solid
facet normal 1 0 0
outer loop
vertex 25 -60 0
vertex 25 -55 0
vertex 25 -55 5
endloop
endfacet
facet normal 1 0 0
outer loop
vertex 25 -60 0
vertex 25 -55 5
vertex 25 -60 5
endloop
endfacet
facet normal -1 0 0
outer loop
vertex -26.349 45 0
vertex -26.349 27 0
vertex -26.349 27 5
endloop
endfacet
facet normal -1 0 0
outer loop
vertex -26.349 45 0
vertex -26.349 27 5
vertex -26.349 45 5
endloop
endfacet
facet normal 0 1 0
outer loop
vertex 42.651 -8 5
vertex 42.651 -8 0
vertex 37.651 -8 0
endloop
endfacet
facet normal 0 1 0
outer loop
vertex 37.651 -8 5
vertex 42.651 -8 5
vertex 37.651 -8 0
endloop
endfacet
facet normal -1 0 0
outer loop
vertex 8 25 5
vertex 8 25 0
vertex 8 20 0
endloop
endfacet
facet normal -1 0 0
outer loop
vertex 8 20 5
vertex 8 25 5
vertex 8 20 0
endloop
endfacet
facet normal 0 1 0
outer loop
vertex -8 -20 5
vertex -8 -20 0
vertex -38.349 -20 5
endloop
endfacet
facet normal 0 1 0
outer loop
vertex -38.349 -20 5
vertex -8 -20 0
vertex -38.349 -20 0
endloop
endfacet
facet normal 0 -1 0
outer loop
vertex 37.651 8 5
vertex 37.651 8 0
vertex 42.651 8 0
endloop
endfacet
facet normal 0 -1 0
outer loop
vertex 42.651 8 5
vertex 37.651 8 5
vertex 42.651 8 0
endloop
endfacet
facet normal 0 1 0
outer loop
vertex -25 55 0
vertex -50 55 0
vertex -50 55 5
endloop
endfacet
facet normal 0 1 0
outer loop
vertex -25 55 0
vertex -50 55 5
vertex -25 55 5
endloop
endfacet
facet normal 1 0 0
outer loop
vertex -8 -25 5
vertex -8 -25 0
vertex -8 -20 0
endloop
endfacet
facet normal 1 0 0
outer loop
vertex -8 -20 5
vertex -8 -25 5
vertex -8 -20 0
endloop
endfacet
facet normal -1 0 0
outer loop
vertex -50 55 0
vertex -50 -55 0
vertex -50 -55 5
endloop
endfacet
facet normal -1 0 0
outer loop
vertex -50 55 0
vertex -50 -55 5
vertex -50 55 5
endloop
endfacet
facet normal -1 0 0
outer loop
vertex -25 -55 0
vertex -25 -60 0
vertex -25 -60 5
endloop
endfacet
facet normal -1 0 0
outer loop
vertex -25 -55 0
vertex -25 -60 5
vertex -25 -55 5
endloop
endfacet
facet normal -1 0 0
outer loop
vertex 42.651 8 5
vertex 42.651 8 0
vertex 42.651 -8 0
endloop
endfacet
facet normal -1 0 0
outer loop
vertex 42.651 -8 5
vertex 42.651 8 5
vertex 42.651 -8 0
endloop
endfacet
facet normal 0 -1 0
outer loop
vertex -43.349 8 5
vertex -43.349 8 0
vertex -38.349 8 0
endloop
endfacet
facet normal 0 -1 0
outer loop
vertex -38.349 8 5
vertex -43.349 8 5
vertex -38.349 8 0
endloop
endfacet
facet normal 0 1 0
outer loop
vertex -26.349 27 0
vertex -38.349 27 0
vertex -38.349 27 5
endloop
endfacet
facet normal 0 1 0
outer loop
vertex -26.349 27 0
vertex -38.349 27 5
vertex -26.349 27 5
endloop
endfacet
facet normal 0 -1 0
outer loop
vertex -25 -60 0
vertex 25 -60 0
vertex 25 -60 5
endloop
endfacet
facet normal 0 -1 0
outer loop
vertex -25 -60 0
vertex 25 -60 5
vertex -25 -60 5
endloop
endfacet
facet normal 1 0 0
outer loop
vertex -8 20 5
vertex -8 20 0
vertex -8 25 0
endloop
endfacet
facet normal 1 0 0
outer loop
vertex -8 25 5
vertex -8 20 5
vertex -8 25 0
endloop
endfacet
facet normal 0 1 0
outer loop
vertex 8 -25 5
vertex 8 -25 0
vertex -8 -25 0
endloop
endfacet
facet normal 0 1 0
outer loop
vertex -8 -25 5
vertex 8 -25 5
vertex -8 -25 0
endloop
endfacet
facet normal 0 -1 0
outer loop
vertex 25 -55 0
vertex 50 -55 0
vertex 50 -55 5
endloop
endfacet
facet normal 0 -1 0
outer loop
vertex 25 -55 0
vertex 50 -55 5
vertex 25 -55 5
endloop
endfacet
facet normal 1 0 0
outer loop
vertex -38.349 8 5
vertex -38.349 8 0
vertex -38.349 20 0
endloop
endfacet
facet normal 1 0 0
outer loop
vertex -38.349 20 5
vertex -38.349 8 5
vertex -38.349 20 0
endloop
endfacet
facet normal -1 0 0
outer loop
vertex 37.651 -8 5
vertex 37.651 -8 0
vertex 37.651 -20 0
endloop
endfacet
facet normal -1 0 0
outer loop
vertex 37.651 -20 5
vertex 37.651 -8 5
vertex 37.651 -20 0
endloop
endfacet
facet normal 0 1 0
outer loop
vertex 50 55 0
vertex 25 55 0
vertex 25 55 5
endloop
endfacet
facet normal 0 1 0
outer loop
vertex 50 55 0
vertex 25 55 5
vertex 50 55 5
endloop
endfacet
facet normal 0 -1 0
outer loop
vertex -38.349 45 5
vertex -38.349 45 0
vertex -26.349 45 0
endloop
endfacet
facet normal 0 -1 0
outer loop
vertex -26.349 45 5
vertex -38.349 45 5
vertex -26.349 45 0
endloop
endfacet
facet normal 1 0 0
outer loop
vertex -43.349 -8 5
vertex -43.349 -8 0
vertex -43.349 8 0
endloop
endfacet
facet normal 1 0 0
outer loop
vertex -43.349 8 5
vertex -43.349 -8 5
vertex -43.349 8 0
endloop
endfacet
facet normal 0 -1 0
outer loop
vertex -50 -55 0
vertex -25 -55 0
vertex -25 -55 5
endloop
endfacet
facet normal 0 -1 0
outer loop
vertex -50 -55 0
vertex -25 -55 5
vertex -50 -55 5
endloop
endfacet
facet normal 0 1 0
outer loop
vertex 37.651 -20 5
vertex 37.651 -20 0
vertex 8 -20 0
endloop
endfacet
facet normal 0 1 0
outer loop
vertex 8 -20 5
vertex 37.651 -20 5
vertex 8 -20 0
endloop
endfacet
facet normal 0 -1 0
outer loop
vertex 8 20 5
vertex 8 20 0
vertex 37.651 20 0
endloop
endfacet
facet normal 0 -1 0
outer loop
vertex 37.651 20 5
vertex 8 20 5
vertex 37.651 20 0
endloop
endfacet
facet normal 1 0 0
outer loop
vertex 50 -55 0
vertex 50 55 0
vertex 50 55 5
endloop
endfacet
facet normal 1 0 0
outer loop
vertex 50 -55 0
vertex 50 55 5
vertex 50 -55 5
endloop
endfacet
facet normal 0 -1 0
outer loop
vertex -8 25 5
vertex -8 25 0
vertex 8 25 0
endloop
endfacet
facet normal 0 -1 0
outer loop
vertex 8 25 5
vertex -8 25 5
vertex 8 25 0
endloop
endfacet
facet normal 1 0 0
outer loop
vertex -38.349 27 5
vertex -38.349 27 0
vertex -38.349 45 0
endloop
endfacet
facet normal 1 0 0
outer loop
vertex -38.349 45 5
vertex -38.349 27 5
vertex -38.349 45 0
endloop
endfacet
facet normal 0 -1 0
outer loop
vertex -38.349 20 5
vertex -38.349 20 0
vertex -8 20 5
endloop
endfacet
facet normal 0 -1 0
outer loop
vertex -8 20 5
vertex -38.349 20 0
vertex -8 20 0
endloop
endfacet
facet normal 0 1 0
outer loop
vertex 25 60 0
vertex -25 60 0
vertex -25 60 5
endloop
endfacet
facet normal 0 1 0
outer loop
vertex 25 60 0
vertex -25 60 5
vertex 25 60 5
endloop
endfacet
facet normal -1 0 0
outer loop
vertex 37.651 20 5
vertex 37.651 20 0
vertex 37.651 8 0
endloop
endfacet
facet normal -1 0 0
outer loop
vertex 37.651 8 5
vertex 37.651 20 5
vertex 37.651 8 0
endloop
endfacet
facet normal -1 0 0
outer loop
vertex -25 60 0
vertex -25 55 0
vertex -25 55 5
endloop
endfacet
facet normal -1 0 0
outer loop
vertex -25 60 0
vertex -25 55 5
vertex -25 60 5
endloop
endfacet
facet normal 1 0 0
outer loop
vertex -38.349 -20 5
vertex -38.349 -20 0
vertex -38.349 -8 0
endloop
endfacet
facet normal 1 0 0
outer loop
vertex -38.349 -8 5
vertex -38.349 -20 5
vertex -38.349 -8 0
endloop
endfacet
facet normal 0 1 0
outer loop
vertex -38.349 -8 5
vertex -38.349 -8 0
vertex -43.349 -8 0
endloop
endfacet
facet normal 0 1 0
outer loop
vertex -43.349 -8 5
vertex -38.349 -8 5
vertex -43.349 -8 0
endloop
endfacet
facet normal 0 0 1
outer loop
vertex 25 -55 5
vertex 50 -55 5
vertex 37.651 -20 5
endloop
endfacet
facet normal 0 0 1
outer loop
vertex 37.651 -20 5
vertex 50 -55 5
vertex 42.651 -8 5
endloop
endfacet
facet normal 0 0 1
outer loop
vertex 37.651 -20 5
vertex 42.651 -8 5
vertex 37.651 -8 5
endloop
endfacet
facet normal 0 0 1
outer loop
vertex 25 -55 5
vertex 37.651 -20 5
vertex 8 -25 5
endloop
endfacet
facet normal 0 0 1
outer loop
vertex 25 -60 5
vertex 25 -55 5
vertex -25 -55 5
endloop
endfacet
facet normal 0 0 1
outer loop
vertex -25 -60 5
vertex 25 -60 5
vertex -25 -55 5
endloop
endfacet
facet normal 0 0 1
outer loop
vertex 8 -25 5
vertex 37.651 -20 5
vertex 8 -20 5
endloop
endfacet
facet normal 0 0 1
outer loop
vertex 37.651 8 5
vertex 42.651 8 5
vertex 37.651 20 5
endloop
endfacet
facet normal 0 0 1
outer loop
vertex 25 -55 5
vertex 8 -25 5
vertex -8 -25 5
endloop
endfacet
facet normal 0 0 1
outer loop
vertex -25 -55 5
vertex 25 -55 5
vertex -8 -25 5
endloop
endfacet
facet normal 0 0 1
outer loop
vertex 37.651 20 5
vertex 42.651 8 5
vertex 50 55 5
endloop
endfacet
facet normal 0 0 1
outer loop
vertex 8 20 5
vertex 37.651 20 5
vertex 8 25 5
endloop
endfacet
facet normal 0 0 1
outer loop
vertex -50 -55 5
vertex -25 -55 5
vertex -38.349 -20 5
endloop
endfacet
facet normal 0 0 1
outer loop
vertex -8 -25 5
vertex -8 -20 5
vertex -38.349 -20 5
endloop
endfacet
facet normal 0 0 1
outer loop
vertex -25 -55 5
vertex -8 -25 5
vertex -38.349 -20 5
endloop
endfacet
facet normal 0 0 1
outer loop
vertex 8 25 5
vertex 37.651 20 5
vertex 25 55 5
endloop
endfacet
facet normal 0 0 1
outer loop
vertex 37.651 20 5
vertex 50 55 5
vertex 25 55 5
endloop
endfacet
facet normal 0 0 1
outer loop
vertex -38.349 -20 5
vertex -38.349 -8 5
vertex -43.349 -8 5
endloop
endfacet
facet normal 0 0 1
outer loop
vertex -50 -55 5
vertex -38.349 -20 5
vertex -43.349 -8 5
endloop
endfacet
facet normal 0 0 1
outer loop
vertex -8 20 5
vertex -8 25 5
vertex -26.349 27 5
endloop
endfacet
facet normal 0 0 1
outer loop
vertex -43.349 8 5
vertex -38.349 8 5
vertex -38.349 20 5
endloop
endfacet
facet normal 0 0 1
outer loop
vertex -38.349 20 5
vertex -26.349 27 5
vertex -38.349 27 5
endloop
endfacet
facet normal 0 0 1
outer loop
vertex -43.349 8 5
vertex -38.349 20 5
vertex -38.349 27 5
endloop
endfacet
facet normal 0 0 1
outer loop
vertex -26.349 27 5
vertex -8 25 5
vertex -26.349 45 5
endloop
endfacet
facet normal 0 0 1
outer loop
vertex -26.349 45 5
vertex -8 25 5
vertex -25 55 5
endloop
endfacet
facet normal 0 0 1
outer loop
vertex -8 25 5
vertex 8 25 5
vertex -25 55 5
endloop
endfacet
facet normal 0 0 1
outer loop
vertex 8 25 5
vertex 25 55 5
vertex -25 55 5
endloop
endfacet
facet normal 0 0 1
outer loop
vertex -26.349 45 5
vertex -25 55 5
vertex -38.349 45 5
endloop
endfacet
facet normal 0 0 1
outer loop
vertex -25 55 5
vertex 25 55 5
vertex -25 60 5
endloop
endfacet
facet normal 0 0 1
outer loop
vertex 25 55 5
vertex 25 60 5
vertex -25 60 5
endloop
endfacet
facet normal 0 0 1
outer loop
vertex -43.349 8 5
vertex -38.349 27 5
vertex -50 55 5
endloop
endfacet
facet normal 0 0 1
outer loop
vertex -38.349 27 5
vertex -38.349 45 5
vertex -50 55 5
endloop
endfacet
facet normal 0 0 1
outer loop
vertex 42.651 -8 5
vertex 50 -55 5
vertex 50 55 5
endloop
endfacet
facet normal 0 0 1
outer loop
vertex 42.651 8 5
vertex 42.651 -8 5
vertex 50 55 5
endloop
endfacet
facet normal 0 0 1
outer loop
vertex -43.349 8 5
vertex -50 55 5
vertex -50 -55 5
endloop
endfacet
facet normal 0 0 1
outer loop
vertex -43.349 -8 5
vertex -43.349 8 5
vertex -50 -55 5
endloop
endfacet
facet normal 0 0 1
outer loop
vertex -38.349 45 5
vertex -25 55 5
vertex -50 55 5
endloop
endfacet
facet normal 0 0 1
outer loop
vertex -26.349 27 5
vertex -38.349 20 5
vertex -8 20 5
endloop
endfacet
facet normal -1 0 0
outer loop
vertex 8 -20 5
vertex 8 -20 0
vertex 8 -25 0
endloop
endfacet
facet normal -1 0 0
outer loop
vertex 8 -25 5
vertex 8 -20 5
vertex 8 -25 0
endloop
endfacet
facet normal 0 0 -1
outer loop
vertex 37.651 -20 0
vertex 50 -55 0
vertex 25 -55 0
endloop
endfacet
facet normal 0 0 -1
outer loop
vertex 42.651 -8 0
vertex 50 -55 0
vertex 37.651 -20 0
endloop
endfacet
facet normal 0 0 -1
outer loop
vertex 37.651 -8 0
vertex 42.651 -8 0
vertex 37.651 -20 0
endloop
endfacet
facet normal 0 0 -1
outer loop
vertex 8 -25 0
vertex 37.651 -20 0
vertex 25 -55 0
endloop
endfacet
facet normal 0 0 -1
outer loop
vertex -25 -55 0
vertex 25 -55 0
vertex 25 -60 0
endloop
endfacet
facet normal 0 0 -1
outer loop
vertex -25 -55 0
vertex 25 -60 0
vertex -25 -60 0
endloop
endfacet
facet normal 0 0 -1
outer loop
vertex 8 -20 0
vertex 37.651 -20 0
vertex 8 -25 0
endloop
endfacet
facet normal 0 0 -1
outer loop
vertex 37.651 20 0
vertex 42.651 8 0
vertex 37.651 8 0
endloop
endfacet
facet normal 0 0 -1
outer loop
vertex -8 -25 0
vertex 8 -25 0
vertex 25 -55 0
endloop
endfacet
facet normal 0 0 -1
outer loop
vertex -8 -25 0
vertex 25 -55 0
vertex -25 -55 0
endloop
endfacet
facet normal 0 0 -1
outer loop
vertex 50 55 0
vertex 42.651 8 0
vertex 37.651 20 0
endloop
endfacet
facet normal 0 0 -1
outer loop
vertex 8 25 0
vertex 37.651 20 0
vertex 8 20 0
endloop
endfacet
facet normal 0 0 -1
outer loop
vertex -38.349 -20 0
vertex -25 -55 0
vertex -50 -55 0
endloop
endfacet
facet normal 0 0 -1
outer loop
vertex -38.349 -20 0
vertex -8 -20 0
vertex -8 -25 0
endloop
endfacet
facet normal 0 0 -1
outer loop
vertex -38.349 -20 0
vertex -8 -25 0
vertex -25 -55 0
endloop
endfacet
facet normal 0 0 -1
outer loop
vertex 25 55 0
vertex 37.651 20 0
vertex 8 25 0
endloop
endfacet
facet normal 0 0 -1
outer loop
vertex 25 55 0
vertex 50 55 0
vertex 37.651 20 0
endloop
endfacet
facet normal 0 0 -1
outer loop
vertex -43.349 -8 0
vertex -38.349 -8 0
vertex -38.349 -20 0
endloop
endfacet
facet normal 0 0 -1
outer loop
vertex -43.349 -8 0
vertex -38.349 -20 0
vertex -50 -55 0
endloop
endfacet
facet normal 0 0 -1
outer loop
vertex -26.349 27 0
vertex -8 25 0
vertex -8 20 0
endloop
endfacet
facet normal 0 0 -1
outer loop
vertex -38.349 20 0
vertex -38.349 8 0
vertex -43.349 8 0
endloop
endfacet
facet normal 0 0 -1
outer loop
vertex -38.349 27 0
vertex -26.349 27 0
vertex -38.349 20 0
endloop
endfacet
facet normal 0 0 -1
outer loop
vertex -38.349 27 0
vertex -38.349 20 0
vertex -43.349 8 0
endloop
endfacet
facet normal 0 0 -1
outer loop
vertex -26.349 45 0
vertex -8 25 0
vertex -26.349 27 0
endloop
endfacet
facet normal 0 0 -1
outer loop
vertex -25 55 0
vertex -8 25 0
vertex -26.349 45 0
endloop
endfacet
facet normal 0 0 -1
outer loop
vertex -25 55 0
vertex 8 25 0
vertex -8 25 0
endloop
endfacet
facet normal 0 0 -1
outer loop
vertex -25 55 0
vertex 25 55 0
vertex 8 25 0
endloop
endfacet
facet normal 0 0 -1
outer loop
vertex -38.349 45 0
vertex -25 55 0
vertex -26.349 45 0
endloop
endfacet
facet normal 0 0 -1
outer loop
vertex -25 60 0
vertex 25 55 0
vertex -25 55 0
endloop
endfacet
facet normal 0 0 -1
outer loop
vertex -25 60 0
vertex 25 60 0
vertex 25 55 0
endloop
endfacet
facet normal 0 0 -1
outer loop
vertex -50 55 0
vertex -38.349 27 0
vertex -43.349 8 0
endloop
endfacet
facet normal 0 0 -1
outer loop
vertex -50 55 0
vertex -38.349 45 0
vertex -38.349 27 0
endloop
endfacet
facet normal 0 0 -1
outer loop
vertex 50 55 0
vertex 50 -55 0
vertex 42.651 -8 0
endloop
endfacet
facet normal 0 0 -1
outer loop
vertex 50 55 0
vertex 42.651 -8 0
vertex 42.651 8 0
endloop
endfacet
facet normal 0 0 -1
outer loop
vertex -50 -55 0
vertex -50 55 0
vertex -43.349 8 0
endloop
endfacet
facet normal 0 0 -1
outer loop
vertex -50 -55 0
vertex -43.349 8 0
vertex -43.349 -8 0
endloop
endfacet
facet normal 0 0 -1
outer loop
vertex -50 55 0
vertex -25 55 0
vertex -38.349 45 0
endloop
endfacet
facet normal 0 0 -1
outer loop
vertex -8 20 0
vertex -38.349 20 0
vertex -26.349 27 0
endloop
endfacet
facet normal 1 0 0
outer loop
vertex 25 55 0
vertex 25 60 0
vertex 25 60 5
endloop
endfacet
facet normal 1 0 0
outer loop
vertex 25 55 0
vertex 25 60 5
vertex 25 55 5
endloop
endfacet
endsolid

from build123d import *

# Parameters (mm, degrees)
SKETCH1_W           = 12
SKETCH1_H           = 18
BOSS_EXTRUDE1_DEPTH = 5


with BuildPart() as part:
    # Sketch1 → Boss-Extrude1 (new body)
    with BuildSketch(Plane.XY):
        Polygon((-25, 60), (25, 60), (25, 55), (50, 55), (50, -55), (25, -55), (25, -60), (-25, -60), (-25, -55), (-50, -55), (-50, 55), (-25, 55), align=None)
        Polygon((37.651162791, 8), (42.651162791, 8), (42.651162791, -8), (37.651162791, -8), (37.651162791, -20), (8, -20), (8, -25), (-8, -25), (-8, -20), (-38.348837209, -20), (-38.348837209, -8), (-43.348837209, -8), (-43.348837209, 8), (-38.348837209, 8), (-38.348837209, 20), (-8, 20), (-8, 25), (8, 25), (8, 20), (37.651162791, 20), align=None, mode=Mode.SUBTRACT)
        with Locations((-32.348837209, 36)):
            Rectangle(SKETCH1_W, SKETCH1_H, mode=Mode.SUBTRACT)
    extrude(amount=BOSS_EXTRUDE1_DEPTH)


solid = part.part
